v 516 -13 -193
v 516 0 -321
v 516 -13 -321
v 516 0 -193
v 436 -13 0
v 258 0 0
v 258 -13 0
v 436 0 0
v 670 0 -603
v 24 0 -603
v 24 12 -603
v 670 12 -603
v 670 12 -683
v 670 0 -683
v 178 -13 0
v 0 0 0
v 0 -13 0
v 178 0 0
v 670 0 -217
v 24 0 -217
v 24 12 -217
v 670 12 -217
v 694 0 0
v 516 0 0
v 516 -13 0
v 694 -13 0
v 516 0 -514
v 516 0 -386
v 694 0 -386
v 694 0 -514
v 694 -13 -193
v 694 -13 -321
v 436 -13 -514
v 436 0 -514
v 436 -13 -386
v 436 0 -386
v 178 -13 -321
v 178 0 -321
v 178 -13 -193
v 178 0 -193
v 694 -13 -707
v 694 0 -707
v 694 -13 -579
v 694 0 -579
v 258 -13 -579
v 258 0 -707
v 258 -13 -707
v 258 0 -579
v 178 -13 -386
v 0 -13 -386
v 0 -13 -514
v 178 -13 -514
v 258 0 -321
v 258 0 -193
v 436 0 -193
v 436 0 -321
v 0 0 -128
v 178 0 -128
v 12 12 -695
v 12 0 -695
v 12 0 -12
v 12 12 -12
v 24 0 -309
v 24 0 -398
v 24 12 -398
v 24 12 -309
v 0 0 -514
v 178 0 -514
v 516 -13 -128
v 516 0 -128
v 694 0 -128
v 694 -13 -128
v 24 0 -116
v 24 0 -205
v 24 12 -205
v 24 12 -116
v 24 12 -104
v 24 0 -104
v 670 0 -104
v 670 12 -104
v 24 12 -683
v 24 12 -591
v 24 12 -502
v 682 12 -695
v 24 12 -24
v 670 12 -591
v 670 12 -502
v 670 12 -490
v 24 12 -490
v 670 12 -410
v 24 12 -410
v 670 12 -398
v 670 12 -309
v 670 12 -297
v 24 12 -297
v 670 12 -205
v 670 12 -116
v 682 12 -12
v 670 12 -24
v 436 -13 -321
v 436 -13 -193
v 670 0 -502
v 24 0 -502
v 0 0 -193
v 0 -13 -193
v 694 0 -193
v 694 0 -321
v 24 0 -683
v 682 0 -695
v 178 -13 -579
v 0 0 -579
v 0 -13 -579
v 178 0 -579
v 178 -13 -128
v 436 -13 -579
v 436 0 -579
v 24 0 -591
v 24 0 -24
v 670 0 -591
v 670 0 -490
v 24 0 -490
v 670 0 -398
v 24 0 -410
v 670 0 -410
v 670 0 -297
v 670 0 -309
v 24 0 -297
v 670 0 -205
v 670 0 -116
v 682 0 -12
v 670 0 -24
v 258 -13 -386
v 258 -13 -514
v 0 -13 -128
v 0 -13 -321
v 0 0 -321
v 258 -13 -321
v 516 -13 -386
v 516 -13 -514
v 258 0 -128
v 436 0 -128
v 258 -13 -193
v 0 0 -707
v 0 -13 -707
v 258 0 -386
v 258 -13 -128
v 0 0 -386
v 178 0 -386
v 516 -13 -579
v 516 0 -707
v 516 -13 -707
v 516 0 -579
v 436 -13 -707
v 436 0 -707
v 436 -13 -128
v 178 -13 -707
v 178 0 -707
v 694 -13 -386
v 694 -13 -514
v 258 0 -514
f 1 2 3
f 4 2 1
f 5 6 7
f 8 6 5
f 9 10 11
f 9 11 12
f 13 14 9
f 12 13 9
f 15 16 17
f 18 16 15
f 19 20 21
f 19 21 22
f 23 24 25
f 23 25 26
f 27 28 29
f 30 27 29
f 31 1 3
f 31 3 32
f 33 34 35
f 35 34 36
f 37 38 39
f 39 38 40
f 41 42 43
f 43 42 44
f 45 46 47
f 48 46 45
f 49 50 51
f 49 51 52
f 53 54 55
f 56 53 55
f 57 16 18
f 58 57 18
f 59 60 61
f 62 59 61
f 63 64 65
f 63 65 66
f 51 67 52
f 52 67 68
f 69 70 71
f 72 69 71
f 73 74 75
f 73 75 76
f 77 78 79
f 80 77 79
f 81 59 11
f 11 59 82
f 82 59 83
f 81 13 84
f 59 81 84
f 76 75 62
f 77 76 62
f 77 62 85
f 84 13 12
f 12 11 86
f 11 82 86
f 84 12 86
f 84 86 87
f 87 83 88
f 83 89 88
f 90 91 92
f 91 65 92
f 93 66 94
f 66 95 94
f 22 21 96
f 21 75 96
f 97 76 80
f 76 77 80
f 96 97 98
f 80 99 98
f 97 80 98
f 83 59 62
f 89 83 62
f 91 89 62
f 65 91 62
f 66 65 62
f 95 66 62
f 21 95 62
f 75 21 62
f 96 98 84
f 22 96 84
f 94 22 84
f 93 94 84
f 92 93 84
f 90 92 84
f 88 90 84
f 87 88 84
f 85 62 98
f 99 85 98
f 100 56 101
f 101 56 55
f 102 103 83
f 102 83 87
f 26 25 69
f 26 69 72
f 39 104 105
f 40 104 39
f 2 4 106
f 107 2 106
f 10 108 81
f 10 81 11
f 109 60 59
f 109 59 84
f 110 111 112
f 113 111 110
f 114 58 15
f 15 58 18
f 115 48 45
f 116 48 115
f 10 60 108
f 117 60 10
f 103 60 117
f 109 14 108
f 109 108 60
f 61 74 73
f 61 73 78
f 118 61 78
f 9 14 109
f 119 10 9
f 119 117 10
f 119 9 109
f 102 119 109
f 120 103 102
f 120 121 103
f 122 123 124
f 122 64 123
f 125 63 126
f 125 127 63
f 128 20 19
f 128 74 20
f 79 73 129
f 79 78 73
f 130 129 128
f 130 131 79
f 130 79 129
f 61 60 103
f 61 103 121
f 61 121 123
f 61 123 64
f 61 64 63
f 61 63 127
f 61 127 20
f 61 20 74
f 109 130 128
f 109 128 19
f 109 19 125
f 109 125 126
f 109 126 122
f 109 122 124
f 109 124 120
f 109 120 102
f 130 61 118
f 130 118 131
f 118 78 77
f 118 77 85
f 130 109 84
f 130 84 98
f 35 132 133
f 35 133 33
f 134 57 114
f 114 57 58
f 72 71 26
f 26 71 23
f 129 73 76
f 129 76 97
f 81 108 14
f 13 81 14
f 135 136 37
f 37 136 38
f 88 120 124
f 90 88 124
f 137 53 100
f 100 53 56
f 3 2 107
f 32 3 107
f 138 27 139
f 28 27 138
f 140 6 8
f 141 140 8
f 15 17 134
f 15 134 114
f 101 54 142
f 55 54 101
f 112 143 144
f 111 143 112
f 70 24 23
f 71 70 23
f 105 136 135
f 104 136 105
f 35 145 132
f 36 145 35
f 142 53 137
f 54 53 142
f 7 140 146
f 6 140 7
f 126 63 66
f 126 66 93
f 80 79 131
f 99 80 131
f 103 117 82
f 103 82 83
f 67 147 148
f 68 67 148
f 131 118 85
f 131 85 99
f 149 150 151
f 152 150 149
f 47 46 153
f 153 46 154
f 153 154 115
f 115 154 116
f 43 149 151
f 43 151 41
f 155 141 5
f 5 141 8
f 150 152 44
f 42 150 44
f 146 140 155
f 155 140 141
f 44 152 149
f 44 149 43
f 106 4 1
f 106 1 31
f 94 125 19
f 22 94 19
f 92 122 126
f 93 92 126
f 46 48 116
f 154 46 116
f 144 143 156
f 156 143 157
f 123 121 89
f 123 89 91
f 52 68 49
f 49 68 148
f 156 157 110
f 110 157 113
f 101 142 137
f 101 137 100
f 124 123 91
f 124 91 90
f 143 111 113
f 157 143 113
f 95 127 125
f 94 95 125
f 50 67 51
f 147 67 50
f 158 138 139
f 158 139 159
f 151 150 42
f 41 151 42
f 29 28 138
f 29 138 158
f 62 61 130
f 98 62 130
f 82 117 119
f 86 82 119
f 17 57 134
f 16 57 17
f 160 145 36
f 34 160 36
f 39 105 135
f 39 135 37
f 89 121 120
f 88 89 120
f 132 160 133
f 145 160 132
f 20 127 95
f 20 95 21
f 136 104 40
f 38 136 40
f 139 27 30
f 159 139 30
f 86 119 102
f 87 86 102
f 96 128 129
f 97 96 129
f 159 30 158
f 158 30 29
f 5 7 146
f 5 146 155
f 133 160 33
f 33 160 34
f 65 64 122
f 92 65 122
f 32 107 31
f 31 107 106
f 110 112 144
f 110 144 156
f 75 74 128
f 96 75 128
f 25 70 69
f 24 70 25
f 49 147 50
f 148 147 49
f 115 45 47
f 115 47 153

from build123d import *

# Parameters (mm, degrees)
F0_W     = 670
F0_H     = 683
F0_W_2   = 646
F0_H_2   = 80
F0_H_3   = 89
F1_DEPTH = 12
F2_W     = 178
F2_H     = 128
F3_DEPTH = 13


with BuildPart() as f1:
    # F0 (on Front) → F1 (new body)
    with BuildSketch(Plane.XZ):
        with Locations((347, -353.5)):
            Rectangle(F0_W, F0_H)
        with Locations((347, -643)):
            Rectangle(F0_W_2, F0_H_2, mode=Mode.SUBTRACT)
        with Locations((347, -546.5)):
            Rectangle(F0_W_2, F0_H_3, mode=Mode.SUBTRACT)
        with Locations((347, -450)):
            Rectangle(F0_W_2, F0_H_2, mode=Mode.SUBTRACT)
        with Locations((347, -353.5)):
            Rectangle(F0_W_2, F0_H_3, mode=Mode.SUBTRACT)
        with Locations((347, -257)):
            Rectangle(F0_W_2, F0_H_2, mode=Mode.SUBTRACT)
        with Locations((347, -160.5)):
            Rectangle(F0_W_2, F0_H_3, mode=Mode.SUBTRACT)
        with Locations((347, -64)):
            Rectangle(F0_W_2, F0_H_2, mode=Mode.SUBTRACT)
    extrude(amount=-F1_DEPTH)


with BuildPart() as f3:
    # F2 (on Front) → F3 (new body)
    with BuildSketch(Plane.XZ):
        with Locations((89, -64)):
            Rectangle(F2_W, F2_H)
        with Locations((347, -64)):
            Rectangle(F2_W, F2_H)
        with Locations((605, -64)):
            Rectangle(F2_W, F2_H)
        with Locations((89, -257)):
            Rectangle(F2_W, F2_H)
        with Locations((347, -257)):
            Rectangle(F2_W, F2_H)
        with Locations((605, -257)):
            Rectangle(F2_W, F2_H)
        with Locations((89, -450)):
            Rectangle(F2_W, F2_H)
        with Locations((347, -450)):
            Rectangle(F2_W, F2_H)
        with Locations((605, -450)):
            Rectangle(F2_W, F2_H)
        with Locations((89, -643)):
            Rectangle(F2_W, F2_H)
        with Locations((347, -643)):
            Rectangle(F2_W, F2_H)
        with Locations((605, -643)):
            Rectangle(F2_W, F2_H)
    extrude(amount=F3_DEPTH)


solid = Compound([f1.part, f3.part])
